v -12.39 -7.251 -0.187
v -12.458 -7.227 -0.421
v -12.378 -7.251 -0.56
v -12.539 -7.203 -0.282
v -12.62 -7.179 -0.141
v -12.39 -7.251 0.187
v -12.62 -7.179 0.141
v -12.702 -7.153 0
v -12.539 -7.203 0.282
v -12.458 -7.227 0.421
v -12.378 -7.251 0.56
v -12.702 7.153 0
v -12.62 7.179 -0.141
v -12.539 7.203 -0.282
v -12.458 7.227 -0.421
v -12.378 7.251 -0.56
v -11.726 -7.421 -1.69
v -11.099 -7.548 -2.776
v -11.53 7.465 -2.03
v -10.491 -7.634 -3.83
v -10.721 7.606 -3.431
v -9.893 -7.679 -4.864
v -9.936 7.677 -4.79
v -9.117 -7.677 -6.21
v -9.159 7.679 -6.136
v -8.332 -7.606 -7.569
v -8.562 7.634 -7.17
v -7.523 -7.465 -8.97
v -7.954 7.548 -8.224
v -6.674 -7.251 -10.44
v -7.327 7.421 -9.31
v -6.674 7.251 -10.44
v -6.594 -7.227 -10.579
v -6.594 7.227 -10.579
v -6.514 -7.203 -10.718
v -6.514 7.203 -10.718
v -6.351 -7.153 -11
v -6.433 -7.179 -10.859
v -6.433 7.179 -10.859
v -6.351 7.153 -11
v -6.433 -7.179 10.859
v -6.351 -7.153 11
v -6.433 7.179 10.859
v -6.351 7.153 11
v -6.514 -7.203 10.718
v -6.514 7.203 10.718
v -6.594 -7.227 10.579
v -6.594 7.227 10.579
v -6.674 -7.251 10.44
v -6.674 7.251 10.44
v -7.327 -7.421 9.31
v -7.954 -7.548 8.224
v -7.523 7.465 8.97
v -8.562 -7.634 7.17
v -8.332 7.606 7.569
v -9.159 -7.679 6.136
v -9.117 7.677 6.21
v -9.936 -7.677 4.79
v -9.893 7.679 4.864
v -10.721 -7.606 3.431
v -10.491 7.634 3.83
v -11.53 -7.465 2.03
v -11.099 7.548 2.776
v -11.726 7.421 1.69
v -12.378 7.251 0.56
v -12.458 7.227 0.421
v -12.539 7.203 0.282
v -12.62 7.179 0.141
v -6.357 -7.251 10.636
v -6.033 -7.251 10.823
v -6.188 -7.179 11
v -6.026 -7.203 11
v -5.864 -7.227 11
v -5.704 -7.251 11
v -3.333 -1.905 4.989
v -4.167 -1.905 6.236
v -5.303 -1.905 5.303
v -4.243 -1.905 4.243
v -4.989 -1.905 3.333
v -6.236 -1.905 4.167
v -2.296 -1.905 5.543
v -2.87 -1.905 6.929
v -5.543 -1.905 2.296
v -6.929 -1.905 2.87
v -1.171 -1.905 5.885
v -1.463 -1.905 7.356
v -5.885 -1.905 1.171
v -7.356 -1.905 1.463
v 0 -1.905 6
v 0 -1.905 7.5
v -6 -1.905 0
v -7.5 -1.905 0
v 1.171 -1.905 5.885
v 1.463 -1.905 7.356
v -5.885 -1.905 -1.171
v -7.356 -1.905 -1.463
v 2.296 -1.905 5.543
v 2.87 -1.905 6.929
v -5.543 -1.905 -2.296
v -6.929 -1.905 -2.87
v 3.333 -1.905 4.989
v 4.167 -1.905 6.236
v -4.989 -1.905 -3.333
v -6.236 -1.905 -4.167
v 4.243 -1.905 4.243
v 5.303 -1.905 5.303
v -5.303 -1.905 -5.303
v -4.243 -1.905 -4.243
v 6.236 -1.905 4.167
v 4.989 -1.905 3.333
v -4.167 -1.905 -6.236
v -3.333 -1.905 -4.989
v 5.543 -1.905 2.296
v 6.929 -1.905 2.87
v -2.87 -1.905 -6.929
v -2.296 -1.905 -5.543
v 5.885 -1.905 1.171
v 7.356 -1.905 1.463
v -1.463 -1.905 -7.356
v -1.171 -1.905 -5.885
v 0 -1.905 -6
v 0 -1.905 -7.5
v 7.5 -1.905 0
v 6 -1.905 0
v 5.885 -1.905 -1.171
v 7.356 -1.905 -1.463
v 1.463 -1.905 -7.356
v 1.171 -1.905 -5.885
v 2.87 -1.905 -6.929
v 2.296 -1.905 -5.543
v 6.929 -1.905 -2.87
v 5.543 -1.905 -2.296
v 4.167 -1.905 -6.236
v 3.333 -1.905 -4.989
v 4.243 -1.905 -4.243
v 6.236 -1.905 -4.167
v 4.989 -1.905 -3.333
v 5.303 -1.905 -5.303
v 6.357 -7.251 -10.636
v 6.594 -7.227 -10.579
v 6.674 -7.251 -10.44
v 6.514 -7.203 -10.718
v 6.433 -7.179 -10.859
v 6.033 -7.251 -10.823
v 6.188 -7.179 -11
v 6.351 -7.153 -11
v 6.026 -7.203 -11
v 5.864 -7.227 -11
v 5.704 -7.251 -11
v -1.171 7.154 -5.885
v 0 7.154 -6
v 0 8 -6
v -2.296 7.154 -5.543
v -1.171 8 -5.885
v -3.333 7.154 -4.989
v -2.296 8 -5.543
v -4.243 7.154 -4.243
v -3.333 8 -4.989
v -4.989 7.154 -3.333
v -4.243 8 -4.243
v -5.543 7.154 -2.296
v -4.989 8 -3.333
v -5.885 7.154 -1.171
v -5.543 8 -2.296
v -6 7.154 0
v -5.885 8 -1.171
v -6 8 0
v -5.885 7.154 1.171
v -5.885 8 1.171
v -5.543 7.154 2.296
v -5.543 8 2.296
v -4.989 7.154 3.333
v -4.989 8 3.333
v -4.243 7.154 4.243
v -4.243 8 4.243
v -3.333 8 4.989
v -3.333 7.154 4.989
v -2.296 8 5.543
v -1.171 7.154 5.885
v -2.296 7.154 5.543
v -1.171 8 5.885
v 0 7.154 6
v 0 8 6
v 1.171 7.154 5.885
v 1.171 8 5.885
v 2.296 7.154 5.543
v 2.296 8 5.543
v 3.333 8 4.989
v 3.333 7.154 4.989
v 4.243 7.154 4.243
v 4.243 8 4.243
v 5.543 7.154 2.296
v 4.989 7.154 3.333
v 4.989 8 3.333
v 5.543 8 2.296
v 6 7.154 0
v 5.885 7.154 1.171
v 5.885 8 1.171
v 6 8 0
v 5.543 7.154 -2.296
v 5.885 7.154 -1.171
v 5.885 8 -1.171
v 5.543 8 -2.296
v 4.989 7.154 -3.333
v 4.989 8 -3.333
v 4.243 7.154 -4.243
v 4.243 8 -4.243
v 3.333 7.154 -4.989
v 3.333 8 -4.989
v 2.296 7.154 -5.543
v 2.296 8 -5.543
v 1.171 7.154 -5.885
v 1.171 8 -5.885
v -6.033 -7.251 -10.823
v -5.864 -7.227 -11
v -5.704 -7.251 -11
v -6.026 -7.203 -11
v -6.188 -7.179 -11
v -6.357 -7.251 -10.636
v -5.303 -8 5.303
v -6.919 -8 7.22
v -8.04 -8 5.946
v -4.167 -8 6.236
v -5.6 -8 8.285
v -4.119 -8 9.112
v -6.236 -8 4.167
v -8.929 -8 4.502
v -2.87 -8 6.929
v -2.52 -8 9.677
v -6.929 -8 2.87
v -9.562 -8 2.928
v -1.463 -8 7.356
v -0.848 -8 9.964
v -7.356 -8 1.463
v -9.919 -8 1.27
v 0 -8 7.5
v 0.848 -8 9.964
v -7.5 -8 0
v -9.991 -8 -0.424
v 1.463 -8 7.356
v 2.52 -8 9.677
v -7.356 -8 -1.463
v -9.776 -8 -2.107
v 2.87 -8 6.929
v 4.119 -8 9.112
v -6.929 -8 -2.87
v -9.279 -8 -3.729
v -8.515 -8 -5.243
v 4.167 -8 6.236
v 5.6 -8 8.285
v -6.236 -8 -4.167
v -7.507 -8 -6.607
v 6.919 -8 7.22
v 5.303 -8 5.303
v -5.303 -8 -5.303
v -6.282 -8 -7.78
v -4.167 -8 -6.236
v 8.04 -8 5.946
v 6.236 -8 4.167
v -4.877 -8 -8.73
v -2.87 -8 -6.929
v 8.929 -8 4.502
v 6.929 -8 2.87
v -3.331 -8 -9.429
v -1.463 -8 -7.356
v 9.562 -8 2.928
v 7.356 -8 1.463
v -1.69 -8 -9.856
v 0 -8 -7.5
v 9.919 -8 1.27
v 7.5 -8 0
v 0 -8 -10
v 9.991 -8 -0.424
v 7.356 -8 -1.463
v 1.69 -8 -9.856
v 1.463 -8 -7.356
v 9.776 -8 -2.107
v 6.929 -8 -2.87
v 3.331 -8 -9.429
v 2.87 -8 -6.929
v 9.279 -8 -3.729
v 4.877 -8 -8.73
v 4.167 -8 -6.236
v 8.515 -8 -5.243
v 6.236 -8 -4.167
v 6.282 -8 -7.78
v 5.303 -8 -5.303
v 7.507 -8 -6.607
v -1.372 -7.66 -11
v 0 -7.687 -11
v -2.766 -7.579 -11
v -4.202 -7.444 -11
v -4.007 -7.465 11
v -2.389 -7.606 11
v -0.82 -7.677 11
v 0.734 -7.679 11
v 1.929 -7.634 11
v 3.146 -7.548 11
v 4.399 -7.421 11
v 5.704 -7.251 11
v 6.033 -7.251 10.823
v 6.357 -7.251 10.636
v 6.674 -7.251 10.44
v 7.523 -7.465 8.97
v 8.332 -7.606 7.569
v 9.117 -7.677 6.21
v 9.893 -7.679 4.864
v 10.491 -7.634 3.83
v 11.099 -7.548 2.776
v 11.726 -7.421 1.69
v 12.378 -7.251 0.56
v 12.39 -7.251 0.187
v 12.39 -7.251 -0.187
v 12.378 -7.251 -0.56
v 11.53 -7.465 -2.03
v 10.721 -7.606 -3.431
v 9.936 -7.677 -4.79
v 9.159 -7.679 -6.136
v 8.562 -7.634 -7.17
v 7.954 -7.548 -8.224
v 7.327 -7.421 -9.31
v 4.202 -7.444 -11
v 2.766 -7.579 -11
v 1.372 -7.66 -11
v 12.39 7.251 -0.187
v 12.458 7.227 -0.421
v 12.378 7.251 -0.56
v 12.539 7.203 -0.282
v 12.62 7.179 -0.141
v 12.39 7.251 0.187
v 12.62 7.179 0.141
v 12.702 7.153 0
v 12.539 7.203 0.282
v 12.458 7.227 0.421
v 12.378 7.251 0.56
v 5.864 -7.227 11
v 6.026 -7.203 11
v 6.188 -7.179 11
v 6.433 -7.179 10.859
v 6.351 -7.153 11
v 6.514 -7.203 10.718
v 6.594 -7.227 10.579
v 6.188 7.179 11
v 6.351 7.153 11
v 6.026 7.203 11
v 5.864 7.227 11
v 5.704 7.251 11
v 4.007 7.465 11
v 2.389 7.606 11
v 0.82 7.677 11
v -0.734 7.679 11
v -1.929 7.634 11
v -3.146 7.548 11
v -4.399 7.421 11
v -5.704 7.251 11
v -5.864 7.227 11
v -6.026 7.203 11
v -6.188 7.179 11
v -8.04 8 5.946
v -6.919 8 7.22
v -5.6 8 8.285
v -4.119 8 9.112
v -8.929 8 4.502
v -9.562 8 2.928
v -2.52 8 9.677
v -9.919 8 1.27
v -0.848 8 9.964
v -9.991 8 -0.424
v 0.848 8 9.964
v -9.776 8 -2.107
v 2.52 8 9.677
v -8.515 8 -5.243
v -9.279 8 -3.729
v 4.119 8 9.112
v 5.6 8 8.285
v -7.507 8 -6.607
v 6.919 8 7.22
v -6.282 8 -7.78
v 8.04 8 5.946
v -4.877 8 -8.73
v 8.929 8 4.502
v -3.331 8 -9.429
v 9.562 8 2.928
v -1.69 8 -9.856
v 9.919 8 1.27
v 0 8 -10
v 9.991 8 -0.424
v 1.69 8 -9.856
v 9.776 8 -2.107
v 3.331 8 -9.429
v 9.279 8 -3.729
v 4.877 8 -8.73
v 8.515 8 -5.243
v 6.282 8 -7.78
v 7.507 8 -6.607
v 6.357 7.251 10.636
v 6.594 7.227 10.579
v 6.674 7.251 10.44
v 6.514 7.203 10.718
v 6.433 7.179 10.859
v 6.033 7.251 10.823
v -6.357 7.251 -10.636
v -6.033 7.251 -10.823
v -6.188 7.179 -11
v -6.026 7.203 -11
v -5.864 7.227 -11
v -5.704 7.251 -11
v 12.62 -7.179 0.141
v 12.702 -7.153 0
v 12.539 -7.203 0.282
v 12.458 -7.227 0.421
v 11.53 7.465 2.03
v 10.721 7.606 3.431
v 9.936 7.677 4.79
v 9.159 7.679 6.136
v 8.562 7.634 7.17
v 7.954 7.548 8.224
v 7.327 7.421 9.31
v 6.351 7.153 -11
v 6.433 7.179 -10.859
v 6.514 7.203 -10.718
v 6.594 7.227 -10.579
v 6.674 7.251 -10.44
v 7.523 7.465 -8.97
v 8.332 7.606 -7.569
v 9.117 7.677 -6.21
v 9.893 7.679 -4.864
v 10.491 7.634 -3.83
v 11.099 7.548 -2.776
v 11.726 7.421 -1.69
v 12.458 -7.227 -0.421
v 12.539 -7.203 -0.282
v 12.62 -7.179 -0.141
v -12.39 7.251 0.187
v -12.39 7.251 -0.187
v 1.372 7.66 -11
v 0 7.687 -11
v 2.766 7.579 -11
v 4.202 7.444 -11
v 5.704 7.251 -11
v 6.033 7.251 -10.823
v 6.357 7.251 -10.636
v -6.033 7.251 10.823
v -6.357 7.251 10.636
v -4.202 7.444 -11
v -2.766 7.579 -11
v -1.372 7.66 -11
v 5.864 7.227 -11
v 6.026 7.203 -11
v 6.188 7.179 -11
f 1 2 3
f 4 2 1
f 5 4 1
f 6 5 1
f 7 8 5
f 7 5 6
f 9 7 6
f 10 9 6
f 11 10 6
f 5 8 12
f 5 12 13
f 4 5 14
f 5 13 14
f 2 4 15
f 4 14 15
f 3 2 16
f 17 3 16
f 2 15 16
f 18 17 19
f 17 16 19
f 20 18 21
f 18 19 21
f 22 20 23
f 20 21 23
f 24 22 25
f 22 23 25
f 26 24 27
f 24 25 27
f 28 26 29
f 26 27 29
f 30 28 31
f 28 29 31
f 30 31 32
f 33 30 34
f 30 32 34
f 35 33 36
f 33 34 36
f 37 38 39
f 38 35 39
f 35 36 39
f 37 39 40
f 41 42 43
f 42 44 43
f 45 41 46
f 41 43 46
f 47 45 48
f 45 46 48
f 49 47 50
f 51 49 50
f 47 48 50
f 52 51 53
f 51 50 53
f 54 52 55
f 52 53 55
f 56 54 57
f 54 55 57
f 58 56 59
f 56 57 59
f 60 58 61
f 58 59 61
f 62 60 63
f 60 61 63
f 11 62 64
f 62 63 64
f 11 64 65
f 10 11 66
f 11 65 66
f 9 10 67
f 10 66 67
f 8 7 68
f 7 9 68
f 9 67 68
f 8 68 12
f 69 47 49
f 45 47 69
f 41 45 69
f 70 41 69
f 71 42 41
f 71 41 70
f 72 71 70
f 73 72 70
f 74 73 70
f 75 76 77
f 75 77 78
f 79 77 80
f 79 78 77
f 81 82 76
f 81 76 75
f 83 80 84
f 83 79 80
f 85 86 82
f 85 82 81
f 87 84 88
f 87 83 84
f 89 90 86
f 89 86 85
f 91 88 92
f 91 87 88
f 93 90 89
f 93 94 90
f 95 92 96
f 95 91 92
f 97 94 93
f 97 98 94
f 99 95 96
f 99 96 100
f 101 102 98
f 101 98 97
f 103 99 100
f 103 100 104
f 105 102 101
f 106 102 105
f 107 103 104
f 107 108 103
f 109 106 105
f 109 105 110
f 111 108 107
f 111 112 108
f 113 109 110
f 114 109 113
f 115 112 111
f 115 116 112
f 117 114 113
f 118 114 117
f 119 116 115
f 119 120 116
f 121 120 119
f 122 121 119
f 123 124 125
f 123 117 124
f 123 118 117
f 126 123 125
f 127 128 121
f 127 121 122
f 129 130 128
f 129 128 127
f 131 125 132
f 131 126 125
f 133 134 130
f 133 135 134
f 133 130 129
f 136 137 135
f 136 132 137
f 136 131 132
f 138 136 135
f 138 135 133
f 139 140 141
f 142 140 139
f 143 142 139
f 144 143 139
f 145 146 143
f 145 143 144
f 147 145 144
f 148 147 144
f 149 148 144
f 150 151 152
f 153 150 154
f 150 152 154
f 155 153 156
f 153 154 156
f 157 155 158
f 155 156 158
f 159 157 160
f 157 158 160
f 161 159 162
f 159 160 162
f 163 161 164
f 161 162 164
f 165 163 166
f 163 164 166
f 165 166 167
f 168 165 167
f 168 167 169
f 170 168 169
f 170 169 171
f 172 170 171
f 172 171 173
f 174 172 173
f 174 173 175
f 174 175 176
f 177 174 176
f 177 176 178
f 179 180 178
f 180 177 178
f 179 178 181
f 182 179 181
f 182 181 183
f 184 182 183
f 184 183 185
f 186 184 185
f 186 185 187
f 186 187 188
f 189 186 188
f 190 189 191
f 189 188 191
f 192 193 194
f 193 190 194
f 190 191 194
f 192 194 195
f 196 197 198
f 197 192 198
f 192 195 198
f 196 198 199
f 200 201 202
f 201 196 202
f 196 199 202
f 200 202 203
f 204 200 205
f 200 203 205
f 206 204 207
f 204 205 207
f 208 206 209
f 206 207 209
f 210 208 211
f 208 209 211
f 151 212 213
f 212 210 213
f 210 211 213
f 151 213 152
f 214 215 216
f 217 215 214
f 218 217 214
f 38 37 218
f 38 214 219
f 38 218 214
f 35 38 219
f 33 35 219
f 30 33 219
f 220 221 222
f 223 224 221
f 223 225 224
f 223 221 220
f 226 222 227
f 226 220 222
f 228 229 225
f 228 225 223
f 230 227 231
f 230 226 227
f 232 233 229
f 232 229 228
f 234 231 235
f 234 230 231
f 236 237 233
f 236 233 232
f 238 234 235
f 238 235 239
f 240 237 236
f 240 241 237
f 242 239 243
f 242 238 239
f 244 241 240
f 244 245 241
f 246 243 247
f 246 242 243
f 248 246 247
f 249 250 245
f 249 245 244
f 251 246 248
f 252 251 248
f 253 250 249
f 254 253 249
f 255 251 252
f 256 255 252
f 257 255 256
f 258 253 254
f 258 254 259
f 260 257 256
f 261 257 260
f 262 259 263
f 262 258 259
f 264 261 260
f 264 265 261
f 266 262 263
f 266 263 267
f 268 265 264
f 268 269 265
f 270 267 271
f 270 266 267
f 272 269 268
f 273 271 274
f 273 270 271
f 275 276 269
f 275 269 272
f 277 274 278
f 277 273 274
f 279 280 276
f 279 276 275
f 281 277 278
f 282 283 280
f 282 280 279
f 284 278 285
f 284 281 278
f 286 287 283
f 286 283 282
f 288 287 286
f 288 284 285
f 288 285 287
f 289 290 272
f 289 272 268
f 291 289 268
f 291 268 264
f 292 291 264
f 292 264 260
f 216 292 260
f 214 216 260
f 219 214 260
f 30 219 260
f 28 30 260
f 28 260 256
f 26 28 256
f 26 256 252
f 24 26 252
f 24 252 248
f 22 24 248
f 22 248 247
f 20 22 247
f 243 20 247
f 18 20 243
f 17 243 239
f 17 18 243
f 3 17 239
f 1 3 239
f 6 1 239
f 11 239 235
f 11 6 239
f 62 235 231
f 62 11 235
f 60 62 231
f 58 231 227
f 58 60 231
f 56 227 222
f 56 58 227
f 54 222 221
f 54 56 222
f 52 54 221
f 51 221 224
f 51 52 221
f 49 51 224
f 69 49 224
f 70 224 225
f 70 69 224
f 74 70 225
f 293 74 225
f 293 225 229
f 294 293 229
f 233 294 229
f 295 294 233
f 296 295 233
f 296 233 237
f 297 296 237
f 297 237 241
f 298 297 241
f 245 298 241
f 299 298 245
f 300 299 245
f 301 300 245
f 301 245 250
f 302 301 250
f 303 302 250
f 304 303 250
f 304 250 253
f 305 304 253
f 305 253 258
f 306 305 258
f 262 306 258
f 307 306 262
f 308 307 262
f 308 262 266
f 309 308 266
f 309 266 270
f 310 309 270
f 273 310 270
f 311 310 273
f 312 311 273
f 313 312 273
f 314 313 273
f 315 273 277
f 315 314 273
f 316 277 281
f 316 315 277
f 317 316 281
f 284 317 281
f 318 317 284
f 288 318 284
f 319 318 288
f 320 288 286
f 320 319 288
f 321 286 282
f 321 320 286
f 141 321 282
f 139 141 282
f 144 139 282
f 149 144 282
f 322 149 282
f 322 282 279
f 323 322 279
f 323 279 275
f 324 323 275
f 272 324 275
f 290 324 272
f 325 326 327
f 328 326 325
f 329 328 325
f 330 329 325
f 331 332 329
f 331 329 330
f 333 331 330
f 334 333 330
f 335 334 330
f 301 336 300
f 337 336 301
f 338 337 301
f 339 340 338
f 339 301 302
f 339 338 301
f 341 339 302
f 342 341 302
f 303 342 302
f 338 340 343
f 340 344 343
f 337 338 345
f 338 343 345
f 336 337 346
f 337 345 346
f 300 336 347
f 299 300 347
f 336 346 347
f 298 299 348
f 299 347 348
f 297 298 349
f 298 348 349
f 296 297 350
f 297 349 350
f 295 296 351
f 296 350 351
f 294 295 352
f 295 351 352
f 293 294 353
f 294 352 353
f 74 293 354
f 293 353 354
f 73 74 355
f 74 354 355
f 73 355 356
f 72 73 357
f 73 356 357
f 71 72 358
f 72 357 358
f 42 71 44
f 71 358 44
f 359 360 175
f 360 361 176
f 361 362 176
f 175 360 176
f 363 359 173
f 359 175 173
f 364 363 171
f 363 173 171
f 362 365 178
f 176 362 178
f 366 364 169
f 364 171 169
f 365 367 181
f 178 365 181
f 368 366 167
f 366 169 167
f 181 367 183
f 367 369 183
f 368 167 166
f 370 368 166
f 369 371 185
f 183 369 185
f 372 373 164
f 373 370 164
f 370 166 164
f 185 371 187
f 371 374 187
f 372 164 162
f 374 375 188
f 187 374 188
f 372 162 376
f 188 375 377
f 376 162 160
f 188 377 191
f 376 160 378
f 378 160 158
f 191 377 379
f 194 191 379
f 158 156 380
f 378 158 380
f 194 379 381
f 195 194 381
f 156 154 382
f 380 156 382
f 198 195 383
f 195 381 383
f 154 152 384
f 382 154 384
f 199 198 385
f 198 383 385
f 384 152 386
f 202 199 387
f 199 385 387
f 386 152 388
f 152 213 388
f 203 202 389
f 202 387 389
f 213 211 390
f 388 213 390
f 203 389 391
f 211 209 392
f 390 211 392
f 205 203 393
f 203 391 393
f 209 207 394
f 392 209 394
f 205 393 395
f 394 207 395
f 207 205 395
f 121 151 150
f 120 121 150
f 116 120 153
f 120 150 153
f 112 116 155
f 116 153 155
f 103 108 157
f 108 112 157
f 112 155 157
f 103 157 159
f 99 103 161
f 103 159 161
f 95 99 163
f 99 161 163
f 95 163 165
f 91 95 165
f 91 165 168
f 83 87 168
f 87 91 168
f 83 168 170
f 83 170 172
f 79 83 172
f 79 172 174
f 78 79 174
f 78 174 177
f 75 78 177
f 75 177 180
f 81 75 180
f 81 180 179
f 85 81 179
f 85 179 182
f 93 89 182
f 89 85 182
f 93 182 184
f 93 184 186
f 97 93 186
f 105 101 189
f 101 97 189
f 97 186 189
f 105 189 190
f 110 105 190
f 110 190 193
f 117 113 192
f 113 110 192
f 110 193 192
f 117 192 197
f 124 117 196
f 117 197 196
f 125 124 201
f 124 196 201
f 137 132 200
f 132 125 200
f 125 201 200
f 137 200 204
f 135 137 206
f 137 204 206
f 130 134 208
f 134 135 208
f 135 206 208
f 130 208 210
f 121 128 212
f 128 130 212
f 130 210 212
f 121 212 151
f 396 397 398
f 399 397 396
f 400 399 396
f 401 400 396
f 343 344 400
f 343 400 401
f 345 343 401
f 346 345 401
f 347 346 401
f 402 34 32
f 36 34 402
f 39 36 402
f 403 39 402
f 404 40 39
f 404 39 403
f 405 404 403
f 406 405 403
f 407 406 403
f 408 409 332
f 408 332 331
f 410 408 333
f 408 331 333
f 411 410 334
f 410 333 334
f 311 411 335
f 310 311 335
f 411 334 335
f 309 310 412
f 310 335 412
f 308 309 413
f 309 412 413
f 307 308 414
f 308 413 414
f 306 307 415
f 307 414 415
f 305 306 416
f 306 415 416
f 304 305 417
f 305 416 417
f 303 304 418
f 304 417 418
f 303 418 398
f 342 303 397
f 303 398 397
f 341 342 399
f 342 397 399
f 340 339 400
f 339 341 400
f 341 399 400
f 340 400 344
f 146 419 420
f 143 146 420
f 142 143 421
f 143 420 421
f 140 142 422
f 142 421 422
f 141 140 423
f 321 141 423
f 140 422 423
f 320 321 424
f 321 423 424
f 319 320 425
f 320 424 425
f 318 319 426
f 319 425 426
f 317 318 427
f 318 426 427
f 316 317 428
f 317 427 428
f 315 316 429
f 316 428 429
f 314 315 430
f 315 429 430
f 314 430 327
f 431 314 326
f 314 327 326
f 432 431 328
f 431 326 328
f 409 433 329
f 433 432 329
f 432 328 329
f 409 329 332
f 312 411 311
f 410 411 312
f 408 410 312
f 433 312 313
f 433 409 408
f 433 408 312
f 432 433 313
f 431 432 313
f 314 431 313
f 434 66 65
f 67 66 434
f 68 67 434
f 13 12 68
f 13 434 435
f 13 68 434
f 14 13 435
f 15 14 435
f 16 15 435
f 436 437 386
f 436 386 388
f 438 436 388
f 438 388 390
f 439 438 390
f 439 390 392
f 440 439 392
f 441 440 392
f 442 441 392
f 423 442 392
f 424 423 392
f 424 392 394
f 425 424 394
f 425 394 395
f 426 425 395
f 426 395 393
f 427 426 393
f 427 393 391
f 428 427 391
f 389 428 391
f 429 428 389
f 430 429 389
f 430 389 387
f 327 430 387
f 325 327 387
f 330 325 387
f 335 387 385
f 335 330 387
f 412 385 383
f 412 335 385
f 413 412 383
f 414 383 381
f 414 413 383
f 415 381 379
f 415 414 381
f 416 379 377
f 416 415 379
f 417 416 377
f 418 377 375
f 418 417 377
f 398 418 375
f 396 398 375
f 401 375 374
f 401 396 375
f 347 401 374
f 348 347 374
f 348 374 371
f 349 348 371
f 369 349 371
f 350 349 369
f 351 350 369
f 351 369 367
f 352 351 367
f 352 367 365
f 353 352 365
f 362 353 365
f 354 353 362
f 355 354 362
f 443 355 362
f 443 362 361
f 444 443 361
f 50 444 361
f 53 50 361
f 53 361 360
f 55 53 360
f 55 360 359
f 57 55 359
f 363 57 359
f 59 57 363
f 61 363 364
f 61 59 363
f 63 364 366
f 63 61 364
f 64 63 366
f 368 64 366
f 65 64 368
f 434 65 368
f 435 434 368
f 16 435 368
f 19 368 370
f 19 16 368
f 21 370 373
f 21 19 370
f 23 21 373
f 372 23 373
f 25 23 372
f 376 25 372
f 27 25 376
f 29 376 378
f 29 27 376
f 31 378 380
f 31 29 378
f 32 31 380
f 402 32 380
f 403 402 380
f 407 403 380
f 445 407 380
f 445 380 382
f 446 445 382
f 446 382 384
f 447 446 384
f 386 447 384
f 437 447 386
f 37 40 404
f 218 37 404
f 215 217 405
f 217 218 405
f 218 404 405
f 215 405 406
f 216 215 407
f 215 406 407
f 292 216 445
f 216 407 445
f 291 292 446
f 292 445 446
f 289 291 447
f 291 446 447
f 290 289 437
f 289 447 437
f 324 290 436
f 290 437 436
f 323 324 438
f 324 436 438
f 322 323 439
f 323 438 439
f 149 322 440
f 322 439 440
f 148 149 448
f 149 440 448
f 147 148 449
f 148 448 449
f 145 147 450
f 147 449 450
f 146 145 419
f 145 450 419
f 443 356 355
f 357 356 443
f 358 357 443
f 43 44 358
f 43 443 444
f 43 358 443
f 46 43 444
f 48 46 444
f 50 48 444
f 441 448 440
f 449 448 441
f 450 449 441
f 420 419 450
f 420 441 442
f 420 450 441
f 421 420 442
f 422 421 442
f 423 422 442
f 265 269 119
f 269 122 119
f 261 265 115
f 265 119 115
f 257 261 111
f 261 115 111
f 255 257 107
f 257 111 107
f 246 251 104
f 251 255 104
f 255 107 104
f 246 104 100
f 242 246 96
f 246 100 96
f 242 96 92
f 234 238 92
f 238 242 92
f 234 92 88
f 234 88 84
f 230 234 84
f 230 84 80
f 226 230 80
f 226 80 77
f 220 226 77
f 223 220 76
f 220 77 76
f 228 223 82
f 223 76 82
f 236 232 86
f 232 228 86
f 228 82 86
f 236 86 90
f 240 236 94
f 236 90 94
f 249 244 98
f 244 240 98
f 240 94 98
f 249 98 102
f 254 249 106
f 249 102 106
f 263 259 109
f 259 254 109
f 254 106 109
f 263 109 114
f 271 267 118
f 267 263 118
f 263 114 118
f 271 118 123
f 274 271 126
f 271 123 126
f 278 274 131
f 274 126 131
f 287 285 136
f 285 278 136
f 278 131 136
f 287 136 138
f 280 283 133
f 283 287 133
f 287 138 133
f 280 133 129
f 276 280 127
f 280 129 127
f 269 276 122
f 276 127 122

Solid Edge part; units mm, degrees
sketch "Sketch1" plane through (0, 0, 0) normal (0, -1, 0) x (1, 0, 0)
  line L0 (-6.3509, -11) -> (6.3509, -11)
  line L1 (6.3509, -11) -> (12.7017, 0)
  line L2 (12.7017, 0) -> (6.3509, 11)
  line L3 (6.3509, 11) -> (-6.3509, 11)
  line L4 (-6.3509, 11) -> (-12.7017, 0)
  line L5 (-12.7017, 0) -> (-6.3509, -11)
extrude "Protrusion1" add sketch "Sketch1" along normal mid plane 16
sketch "Sketch2" plane through (0, 0, 0) normal (1, 0, 0) x (0, 1, 0)
  line L0 (8, -10) -> (7.2508, -12.391)
revolve "RevolvedCutout1" cut sketch "Sketch2" angle 360 about axis through (0, -63.5, 0) along (0, 1, 0) material side at (0, 7.6731, -11.2105)
mirror "Mirror1" about plane through (0, 0, 0) normal (0, -1, 0) of "RevolvedCutout1"
sketch "Sketch3" plane through (0, 0, 0) normal (1, 0, 0) x (0, 1, 0)
  line L0 (-8, -7.5) -> (-1.9048, -7.5)
  line L1 (-1.9048, -7.5) -> (-1.9048, -6)
  line L2 (-1.9048, -6) -> (7.1535, -6)
revolve "RevolvedCutout3" cut sketch "Sketch3" angle 360 about axis through (0, 7.1535, 0) along (0, -1, 0) material side at (0, -4.9524, -7.45)
